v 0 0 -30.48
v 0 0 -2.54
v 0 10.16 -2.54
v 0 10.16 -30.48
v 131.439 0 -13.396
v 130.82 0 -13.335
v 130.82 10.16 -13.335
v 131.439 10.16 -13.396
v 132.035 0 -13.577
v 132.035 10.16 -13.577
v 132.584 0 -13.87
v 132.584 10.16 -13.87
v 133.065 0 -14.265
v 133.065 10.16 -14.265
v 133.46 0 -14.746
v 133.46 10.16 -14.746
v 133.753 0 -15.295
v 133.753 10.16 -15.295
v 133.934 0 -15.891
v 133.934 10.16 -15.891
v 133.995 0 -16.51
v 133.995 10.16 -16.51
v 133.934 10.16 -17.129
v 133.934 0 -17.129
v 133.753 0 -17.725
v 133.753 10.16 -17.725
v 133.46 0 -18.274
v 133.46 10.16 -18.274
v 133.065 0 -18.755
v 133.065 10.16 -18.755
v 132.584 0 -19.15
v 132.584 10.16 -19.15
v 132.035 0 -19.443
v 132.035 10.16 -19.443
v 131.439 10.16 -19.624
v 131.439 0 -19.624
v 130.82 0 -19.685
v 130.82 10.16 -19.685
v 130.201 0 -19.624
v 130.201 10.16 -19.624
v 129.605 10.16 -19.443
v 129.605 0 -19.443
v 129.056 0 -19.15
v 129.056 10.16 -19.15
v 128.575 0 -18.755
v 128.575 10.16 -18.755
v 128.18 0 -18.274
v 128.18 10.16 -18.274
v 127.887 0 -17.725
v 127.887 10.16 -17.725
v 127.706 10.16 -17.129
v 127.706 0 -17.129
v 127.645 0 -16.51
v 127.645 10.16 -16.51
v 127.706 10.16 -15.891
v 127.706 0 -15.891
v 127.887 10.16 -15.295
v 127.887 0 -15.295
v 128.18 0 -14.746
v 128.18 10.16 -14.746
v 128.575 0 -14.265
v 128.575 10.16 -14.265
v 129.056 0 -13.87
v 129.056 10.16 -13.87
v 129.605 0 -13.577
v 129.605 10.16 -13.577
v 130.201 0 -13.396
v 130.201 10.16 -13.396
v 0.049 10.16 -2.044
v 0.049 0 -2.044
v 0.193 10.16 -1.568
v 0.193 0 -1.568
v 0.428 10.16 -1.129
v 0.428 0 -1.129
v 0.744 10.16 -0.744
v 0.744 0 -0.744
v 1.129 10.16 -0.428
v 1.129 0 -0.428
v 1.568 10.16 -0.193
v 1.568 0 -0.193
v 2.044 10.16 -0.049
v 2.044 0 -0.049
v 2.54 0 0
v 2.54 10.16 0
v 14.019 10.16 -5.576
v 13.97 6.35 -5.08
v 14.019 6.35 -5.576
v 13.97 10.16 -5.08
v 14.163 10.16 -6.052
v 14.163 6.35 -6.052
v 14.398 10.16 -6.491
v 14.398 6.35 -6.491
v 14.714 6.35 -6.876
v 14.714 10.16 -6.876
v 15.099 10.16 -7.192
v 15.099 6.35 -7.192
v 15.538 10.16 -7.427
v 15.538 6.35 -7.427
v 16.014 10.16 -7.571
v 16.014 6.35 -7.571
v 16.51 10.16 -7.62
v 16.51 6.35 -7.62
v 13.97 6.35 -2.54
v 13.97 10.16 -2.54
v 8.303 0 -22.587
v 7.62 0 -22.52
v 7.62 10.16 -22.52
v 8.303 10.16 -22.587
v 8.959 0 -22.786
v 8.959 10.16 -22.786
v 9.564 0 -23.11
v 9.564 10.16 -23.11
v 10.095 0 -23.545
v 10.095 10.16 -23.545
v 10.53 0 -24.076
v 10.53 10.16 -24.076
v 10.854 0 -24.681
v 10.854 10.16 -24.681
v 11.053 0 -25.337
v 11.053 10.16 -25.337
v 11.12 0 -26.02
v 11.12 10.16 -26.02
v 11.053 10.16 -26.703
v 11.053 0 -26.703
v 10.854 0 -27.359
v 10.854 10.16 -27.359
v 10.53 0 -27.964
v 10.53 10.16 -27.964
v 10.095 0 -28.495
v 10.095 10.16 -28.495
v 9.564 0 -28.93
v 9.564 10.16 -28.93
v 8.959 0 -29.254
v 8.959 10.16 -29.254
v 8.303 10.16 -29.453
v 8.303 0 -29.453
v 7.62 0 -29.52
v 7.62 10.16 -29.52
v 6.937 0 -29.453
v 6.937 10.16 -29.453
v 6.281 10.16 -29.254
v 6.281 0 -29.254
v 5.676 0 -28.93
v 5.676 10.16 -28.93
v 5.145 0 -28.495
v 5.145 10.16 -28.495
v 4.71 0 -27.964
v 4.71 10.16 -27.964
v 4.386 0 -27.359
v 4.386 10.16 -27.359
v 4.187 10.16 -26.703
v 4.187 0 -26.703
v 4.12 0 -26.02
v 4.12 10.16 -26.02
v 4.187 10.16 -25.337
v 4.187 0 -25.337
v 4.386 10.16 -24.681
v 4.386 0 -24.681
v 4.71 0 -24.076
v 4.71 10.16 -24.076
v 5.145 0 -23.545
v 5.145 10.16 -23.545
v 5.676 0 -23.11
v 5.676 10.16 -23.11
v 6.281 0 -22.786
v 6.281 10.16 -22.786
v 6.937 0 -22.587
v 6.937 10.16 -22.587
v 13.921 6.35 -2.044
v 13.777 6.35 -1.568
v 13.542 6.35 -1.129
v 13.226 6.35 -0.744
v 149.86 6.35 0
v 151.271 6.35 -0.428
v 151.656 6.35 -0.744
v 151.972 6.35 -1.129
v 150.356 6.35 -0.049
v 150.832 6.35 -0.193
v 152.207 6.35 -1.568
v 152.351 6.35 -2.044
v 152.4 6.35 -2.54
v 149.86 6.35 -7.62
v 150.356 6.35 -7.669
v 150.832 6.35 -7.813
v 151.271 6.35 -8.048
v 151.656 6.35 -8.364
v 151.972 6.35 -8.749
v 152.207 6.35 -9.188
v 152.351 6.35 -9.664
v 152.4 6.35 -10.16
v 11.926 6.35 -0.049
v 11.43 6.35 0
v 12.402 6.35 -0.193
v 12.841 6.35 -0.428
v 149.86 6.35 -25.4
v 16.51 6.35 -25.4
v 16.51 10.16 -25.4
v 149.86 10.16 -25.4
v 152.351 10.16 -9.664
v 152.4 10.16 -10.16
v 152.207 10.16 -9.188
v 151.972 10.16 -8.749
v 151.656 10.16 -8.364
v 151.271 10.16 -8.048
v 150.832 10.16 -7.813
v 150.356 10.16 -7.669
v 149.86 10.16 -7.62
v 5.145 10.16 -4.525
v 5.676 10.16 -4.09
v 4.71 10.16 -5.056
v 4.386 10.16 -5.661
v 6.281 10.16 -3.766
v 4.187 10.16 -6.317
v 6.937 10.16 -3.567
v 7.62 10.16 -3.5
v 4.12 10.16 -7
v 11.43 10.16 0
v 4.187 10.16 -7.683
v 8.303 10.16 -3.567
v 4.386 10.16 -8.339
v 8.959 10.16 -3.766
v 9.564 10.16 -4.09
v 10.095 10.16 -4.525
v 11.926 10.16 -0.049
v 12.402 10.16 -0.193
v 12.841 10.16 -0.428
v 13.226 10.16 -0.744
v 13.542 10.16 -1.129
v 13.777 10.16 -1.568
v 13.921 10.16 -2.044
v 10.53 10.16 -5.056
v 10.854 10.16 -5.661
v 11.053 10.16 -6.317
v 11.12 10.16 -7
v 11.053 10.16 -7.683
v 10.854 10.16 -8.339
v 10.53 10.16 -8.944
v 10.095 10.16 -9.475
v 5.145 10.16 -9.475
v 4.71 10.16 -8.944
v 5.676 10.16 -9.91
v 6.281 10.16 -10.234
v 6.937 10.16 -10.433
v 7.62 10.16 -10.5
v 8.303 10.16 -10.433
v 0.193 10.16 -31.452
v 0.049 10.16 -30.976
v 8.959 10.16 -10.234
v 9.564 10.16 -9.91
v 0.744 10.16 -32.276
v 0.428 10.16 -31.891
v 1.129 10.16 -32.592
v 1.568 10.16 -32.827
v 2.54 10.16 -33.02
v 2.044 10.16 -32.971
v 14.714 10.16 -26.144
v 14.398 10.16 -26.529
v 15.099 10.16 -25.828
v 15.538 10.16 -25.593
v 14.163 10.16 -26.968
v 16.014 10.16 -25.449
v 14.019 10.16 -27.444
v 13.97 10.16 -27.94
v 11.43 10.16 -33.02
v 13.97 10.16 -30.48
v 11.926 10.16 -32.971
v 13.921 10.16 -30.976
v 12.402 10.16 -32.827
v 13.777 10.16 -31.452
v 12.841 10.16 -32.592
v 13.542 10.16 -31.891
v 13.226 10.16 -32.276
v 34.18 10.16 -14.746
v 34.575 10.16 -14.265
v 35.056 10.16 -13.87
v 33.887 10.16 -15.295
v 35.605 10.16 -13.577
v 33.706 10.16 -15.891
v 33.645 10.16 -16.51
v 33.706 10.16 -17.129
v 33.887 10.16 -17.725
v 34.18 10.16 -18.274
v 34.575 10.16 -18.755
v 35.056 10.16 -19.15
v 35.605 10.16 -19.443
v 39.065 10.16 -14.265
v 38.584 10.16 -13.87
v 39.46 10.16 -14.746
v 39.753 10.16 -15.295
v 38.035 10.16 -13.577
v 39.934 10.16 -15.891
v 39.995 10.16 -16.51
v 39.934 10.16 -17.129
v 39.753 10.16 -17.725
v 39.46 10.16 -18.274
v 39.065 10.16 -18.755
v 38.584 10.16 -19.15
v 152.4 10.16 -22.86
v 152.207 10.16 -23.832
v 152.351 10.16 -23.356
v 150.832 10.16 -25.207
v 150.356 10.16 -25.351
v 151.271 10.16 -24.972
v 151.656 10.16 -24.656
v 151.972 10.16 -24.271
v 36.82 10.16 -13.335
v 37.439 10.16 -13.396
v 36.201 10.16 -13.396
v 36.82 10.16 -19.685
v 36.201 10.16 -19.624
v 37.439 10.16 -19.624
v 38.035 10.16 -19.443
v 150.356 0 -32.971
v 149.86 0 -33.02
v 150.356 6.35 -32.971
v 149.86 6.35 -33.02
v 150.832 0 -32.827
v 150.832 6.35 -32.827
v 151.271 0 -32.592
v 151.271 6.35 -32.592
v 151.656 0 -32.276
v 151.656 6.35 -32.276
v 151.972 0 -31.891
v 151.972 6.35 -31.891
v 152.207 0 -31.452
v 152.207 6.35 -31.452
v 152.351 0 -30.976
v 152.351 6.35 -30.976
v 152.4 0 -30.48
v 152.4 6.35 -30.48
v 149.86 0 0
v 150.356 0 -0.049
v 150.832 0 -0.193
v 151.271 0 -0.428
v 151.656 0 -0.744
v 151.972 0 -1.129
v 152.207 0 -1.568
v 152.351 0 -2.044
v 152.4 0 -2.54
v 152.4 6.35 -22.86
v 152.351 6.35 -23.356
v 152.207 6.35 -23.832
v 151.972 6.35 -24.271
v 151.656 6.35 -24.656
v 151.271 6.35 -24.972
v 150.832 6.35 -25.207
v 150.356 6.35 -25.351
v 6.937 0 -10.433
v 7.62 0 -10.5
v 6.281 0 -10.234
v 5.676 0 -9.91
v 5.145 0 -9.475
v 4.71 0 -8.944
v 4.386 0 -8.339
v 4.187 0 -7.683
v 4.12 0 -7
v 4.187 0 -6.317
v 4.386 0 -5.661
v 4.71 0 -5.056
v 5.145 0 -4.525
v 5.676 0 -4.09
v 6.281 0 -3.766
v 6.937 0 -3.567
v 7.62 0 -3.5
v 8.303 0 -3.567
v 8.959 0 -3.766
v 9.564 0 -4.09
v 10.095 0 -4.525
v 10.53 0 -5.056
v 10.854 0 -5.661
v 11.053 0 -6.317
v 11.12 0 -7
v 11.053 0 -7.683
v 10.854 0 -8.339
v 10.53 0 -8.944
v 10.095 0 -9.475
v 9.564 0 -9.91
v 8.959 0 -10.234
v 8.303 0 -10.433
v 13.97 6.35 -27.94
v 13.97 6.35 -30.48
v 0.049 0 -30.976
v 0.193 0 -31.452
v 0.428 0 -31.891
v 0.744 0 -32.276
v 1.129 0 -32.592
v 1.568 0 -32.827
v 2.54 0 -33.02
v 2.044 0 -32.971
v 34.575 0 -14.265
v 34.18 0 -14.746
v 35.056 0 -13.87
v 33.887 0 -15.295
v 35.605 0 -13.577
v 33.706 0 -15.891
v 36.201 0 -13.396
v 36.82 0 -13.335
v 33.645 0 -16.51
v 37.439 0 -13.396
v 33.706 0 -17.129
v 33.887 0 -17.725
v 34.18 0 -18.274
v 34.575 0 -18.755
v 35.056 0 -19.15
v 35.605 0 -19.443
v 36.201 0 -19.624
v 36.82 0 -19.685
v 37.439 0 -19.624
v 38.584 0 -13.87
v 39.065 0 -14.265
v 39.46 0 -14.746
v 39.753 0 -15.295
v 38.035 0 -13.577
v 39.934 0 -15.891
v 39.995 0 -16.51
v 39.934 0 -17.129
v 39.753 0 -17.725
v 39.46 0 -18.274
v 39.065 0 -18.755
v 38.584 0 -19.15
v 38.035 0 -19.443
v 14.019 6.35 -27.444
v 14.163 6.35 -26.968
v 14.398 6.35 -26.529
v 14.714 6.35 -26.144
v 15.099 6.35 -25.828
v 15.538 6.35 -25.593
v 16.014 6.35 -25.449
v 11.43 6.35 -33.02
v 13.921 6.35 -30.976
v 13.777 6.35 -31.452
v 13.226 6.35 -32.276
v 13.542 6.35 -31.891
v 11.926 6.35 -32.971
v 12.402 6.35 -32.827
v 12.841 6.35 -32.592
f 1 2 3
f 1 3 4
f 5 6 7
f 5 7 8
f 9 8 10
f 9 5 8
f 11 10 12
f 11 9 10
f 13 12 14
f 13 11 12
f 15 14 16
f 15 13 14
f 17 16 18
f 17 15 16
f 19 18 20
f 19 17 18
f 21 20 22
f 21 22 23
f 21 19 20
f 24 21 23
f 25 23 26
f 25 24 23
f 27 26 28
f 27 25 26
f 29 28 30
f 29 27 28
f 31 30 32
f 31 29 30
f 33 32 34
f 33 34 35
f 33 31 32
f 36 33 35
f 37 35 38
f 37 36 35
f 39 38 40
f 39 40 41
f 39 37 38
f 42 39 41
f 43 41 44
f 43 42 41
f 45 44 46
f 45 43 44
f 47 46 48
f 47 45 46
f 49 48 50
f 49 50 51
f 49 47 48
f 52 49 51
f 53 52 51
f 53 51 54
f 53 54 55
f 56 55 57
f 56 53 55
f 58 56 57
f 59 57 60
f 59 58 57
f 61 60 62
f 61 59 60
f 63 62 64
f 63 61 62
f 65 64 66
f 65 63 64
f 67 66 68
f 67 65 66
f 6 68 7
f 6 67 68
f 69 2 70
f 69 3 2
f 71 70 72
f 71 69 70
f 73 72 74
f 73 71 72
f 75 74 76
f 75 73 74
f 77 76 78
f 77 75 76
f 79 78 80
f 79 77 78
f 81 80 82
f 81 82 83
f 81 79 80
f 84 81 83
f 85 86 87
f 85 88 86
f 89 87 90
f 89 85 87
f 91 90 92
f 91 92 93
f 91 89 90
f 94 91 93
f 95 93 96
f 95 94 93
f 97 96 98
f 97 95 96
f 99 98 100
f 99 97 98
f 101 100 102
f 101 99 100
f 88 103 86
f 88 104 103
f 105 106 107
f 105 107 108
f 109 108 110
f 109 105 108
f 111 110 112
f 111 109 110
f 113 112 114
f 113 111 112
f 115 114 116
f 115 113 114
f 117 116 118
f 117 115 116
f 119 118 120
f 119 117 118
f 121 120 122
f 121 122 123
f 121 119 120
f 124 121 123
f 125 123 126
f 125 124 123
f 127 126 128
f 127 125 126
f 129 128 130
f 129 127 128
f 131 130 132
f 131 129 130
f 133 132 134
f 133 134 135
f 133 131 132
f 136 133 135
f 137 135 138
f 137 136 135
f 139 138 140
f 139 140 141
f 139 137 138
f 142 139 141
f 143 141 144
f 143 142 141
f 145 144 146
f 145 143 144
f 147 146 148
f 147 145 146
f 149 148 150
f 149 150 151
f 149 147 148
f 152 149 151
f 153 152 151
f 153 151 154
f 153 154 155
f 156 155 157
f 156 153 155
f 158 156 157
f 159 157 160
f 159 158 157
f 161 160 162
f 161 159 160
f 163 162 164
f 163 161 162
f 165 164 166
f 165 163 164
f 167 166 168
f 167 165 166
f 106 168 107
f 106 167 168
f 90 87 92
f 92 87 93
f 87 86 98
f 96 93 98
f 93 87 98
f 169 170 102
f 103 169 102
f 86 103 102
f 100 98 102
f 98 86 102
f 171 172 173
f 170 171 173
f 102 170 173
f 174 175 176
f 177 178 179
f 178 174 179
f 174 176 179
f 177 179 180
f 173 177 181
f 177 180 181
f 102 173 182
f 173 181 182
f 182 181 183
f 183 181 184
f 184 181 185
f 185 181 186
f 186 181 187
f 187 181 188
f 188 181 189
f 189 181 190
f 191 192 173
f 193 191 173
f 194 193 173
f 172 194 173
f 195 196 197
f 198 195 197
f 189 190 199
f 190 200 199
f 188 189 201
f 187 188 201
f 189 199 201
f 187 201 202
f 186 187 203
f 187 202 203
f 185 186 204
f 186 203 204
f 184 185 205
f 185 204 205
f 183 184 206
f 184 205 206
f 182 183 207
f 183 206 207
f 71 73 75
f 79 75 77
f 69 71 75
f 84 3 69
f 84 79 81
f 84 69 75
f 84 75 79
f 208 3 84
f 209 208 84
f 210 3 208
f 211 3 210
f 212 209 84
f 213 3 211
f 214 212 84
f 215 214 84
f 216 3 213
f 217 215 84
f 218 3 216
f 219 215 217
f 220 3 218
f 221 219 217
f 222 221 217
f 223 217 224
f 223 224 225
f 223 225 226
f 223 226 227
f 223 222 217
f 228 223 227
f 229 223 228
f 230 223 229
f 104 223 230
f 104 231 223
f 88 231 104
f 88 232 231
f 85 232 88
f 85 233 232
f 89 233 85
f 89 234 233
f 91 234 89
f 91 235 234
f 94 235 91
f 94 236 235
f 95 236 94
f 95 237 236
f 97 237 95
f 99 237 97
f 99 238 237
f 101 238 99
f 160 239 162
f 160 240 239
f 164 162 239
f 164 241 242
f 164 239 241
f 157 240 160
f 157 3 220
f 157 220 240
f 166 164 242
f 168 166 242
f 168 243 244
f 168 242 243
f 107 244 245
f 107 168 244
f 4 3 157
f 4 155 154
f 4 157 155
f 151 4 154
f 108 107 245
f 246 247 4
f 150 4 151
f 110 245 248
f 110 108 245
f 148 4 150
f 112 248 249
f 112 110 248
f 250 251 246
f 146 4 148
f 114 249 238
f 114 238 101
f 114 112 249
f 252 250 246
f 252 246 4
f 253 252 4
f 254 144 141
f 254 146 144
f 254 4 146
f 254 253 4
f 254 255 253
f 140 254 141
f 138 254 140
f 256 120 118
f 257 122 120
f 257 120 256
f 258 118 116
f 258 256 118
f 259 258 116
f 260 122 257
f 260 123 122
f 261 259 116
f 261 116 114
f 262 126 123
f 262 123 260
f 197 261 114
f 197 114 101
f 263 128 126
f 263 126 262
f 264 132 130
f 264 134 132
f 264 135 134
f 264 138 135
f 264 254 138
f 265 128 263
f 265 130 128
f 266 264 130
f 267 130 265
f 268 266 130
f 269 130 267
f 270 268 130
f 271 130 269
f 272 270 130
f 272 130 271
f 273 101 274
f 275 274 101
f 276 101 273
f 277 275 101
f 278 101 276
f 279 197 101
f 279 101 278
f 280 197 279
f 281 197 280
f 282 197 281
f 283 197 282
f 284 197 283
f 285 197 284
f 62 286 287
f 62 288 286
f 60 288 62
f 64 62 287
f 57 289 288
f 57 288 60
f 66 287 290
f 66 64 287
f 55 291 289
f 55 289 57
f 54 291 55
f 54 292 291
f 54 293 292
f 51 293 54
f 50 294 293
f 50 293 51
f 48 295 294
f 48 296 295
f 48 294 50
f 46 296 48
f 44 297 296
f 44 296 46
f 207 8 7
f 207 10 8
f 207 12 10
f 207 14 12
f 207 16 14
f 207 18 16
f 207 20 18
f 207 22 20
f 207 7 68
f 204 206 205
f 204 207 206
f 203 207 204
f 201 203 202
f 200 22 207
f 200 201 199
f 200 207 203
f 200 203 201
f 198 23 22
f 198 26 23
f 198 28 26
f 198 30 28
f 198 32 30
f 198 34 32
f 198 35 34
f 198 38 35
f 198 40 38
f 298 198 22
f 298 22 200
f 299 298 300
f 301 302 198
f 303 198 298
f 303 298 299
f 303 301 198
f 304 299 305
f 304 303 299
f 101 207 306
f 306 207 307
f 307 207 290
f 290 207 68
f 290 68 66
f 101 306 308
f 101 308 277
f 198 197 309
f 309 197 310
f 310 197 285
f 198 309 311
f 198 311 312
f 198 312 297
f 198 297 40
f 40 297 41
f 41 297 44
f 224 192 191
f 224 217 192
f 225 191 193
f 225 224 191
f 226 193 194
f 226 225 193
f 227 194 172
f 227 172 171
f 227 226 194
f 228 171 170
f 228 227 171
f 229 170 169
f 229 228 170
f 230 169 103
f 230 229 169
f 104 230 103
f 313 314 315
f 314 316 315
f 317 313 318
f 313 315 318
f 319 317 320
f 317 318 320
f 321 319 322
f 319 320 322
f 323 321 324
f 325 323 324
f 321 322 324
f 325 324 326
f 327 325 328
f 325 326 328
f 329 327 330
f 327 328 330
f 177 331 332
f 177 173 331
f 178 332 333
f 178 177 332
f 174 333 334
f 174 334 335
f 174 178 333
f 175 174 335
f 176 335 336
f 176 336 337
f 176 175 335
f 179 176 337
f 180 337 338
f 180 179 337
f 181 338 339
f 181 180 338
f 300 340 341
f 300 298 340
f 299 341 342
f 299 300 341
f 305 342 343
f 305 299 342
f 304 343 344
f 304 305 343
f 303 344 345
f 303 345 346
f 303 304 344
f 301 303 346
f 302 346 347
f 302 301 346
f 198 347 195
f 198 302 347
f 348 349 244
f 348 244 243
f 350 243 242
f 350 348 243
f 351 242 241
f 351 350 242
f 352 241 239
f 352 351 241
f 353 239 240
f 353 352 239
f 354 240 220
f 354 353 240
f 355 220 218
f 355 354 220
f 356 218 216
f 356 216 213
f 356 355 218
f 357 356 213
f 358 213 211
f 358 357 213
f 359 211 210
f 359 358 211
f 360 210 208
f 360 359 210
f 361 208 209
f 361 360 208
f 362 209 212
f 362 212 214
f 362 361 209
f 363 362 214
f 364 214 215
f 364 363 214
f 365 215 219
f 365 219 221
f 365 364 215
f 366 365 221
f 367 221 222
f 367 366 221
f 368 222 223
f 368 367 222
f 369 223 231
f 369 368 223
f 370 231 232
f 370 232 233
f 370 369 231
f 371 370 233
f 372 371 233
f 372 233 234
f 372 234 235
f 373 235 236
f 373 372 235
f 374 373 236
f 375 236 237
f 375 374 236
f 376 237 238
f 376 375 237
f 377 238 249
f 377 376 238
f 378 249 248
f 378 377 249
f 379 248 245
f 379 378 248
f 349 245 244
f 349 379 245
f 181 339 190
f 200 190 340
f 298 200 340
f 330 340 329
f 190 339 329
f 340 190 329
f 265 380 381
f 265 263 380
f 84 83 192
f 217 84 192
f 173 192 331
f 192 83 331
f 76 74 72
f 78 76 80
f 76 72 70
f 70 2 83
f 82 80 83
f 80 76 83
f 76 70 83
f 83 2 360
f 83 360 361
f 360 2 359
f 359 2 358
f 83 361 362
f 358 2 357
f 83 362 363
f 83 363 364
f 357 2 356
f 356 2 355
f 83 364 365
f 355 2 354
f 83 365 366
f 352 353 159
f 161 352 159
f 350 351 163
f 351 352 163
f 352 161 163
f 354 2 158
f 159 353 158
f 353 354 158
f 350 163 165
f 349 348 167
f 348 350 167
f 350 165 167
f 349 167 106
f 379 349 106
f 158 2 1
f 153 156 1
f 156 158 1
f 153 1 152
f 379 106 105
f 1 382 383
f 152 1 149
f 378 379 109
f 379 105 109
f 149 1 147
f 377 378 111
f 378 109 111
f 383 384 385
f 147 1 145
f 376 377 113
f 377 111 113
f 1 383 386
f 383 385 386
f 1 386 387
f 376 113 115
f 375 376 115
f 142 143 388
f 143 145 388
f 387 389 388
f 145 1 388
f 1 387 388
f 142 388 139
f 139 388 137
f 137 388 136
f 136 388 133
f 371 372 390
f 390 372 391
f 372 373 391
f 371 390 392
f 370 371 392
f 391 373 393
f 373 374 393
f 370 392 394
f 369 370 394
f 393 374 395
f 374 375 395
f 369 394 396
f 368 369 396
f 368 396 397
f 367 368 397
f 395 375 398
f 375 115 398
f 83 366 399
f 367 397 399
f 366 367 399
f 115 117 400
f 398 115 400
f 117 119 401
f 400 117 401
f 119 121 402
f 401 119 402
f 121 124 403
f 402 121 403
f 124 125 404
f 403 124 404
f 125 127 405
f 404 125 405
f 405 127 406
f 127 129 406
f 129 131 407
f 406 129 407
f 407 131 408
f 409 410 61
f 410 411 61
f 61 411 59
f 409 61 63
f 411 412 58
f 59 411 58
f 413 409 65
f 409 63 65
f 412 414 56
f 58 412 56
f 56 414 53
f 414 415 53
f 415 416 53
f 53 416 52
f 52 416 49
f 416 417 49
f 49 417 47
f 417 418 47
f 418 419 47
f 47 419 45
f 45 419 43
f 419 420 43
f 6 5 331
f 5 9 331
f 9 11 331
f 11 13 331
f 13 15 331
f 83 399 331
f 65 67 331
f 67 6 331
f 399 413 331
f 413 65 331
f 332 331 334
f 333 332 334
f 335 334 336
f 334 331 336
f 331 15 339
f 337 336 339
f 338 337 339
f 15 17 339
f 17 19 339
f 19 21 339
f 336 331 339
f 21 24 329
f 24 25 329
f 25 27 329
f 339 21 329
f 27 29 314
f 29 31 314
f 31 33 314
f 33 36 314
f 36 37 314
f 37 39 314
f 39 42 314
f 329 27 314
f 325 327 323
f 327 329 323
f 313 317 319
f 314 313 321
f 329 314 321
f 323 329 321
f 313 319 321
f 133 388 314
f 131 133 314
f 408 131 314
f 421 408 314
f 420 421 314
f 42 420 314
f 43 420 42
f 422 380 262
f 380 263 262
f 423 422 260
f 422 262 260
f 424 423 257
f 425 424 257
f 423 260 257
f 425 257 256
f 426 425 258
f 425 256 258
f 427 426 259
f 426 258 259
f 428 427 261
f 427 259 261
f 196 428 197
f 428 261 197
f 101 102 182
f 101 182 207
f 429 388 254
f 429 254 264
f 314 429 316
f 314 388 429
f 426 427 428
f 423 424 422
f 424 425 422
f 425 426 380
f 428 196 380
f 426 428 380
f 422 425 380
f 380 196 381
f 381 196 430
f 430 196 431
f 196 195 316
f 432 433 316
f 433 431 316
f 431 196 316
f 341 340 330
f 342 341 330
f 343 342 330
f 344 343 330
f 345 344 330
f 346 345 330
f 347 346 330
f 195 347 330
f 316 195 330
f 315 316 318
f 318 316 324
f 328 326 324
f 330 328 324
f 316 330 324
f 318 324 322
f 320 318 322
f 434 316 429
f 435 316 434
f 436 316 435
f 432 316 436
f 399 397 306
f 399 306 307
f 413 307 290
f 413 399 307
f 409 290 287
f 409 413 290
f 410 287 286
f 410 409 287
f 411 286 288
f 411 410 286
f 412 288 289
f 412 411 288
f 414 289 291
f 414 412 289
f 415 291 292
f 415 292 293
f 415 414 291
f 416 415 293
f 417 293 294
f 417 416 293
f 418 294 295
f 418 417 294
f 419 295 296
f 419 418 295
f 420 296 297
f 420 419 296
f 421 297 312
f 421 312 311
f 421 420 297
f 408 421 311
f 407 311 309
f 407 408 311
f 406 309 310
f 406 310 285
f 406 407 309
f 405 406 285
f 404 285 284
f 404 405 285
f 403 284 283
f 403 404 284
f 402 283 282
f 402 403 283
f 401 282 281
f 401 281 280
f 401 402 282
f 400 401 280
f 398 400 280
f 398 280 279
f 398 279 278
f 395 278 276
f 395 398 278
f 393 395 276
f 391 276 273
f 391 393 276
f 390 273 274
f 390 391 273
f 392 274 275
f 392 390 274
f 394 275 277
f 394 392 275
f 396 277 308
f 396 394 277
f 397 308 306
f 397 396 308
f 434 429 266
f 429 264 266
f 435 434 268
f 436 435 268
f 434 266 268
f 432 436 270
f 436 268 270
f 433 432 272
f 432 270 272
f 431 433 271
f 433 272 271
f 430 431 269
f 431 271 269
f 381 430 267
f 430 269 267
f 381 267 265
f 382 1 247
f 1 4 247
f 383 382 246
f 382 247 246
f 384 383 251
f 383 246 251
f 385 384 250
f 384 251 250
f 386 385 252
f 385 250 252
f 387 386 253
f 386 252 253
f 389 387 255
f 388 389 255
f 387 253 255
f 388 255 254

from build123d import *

# Parameters (mm, degrees)
SKETCH1_W           = 152.4
SKETCH1_H           = 33.02
SKETCH1_R           = 3.5
SKETCH1_R_2         = 3.175
BOSS_EXTRUDE1_DEPTH = 10.16
SKETCH3_W           = 7.62
SKETCH3_H           = 3.81
CUT_EXTRUDE1_DEPTH  = 138.43
FILLET1_R           = 2.54


with BuildPart() as part:
    # Sketch1 → Boss-Extrude1 (new body)
    with BuildSketch(Plane(origin=(0, 0, 0), x_dir=(1, 0, 0), z_dir=(0, 1, 0))):
        with Locations((76.2, 16.51)):
            Rectangle(SKETCH1_W, SKETCH1_H)
        with Locations(Location((7.62, 26.02, 0), (0, 0, 270))):
            Circle(SKETCH1_R, mode=Mode.SUBTRACT)
        with Locations(Location((7.62, 7, 0), (0, 0, 90))):
            Circle(SKETCH1_R, mode=Mode.SUBTRACT)
        with Locations(Location((130.8199949, 16.51, 0), (0, 0, 270))):
            Circle(SKETCH1_R_2, mode=Mode.SUBTRACT)
        with Locations(Location((36.8200051, 16.51, 0), (0, 0, 270))):
            Circle(SKETCH1_R_2, mode=Mode.SUBTRACT)
    extrude(amount=BOSS_EXTRUDE1_DEPTH)

    # Sketch3 → Cut-Extrude1 (cut)
    with BuildSketch(Plane(origin=(152.4, 0, 0), x_dir=(0, 0, -1), z_dir=(1, 0, 0))):
        with Locations((3.81, 8.255)):
            Rectangle(SKETCH3_W, SKETCH3_H)
        with Locations((29.21, 8.255)):
            Rectangle(SKETCH3_W, SKETCH3_H)
    extrude(amount=-CUT_EXTRUDE1_DEPTH, mode=Mode.SUBTRACT)

    # Fillet1
    fillet1_edges = [part.edges().sort_by_distance(p)[0] for p in [
        (152.4, 3.175, -33.02),
        (152.4, 3.175, 0),
        (13.97, 8.255, 0),
        (13.97, 8.255, -7.62),
        (152.4, 8.255, -7.62),
        (13.97, 8.255, -33.02),
        (13.97, 8.255, -25.4),
        (152.4, 8.255, -25.4),
        (0, 5.08, 0),
        (0, 5.08, -33.02),
    ]]
    fillet(fillet1_edges, radius=FILLET1_R)


solid = part.part
